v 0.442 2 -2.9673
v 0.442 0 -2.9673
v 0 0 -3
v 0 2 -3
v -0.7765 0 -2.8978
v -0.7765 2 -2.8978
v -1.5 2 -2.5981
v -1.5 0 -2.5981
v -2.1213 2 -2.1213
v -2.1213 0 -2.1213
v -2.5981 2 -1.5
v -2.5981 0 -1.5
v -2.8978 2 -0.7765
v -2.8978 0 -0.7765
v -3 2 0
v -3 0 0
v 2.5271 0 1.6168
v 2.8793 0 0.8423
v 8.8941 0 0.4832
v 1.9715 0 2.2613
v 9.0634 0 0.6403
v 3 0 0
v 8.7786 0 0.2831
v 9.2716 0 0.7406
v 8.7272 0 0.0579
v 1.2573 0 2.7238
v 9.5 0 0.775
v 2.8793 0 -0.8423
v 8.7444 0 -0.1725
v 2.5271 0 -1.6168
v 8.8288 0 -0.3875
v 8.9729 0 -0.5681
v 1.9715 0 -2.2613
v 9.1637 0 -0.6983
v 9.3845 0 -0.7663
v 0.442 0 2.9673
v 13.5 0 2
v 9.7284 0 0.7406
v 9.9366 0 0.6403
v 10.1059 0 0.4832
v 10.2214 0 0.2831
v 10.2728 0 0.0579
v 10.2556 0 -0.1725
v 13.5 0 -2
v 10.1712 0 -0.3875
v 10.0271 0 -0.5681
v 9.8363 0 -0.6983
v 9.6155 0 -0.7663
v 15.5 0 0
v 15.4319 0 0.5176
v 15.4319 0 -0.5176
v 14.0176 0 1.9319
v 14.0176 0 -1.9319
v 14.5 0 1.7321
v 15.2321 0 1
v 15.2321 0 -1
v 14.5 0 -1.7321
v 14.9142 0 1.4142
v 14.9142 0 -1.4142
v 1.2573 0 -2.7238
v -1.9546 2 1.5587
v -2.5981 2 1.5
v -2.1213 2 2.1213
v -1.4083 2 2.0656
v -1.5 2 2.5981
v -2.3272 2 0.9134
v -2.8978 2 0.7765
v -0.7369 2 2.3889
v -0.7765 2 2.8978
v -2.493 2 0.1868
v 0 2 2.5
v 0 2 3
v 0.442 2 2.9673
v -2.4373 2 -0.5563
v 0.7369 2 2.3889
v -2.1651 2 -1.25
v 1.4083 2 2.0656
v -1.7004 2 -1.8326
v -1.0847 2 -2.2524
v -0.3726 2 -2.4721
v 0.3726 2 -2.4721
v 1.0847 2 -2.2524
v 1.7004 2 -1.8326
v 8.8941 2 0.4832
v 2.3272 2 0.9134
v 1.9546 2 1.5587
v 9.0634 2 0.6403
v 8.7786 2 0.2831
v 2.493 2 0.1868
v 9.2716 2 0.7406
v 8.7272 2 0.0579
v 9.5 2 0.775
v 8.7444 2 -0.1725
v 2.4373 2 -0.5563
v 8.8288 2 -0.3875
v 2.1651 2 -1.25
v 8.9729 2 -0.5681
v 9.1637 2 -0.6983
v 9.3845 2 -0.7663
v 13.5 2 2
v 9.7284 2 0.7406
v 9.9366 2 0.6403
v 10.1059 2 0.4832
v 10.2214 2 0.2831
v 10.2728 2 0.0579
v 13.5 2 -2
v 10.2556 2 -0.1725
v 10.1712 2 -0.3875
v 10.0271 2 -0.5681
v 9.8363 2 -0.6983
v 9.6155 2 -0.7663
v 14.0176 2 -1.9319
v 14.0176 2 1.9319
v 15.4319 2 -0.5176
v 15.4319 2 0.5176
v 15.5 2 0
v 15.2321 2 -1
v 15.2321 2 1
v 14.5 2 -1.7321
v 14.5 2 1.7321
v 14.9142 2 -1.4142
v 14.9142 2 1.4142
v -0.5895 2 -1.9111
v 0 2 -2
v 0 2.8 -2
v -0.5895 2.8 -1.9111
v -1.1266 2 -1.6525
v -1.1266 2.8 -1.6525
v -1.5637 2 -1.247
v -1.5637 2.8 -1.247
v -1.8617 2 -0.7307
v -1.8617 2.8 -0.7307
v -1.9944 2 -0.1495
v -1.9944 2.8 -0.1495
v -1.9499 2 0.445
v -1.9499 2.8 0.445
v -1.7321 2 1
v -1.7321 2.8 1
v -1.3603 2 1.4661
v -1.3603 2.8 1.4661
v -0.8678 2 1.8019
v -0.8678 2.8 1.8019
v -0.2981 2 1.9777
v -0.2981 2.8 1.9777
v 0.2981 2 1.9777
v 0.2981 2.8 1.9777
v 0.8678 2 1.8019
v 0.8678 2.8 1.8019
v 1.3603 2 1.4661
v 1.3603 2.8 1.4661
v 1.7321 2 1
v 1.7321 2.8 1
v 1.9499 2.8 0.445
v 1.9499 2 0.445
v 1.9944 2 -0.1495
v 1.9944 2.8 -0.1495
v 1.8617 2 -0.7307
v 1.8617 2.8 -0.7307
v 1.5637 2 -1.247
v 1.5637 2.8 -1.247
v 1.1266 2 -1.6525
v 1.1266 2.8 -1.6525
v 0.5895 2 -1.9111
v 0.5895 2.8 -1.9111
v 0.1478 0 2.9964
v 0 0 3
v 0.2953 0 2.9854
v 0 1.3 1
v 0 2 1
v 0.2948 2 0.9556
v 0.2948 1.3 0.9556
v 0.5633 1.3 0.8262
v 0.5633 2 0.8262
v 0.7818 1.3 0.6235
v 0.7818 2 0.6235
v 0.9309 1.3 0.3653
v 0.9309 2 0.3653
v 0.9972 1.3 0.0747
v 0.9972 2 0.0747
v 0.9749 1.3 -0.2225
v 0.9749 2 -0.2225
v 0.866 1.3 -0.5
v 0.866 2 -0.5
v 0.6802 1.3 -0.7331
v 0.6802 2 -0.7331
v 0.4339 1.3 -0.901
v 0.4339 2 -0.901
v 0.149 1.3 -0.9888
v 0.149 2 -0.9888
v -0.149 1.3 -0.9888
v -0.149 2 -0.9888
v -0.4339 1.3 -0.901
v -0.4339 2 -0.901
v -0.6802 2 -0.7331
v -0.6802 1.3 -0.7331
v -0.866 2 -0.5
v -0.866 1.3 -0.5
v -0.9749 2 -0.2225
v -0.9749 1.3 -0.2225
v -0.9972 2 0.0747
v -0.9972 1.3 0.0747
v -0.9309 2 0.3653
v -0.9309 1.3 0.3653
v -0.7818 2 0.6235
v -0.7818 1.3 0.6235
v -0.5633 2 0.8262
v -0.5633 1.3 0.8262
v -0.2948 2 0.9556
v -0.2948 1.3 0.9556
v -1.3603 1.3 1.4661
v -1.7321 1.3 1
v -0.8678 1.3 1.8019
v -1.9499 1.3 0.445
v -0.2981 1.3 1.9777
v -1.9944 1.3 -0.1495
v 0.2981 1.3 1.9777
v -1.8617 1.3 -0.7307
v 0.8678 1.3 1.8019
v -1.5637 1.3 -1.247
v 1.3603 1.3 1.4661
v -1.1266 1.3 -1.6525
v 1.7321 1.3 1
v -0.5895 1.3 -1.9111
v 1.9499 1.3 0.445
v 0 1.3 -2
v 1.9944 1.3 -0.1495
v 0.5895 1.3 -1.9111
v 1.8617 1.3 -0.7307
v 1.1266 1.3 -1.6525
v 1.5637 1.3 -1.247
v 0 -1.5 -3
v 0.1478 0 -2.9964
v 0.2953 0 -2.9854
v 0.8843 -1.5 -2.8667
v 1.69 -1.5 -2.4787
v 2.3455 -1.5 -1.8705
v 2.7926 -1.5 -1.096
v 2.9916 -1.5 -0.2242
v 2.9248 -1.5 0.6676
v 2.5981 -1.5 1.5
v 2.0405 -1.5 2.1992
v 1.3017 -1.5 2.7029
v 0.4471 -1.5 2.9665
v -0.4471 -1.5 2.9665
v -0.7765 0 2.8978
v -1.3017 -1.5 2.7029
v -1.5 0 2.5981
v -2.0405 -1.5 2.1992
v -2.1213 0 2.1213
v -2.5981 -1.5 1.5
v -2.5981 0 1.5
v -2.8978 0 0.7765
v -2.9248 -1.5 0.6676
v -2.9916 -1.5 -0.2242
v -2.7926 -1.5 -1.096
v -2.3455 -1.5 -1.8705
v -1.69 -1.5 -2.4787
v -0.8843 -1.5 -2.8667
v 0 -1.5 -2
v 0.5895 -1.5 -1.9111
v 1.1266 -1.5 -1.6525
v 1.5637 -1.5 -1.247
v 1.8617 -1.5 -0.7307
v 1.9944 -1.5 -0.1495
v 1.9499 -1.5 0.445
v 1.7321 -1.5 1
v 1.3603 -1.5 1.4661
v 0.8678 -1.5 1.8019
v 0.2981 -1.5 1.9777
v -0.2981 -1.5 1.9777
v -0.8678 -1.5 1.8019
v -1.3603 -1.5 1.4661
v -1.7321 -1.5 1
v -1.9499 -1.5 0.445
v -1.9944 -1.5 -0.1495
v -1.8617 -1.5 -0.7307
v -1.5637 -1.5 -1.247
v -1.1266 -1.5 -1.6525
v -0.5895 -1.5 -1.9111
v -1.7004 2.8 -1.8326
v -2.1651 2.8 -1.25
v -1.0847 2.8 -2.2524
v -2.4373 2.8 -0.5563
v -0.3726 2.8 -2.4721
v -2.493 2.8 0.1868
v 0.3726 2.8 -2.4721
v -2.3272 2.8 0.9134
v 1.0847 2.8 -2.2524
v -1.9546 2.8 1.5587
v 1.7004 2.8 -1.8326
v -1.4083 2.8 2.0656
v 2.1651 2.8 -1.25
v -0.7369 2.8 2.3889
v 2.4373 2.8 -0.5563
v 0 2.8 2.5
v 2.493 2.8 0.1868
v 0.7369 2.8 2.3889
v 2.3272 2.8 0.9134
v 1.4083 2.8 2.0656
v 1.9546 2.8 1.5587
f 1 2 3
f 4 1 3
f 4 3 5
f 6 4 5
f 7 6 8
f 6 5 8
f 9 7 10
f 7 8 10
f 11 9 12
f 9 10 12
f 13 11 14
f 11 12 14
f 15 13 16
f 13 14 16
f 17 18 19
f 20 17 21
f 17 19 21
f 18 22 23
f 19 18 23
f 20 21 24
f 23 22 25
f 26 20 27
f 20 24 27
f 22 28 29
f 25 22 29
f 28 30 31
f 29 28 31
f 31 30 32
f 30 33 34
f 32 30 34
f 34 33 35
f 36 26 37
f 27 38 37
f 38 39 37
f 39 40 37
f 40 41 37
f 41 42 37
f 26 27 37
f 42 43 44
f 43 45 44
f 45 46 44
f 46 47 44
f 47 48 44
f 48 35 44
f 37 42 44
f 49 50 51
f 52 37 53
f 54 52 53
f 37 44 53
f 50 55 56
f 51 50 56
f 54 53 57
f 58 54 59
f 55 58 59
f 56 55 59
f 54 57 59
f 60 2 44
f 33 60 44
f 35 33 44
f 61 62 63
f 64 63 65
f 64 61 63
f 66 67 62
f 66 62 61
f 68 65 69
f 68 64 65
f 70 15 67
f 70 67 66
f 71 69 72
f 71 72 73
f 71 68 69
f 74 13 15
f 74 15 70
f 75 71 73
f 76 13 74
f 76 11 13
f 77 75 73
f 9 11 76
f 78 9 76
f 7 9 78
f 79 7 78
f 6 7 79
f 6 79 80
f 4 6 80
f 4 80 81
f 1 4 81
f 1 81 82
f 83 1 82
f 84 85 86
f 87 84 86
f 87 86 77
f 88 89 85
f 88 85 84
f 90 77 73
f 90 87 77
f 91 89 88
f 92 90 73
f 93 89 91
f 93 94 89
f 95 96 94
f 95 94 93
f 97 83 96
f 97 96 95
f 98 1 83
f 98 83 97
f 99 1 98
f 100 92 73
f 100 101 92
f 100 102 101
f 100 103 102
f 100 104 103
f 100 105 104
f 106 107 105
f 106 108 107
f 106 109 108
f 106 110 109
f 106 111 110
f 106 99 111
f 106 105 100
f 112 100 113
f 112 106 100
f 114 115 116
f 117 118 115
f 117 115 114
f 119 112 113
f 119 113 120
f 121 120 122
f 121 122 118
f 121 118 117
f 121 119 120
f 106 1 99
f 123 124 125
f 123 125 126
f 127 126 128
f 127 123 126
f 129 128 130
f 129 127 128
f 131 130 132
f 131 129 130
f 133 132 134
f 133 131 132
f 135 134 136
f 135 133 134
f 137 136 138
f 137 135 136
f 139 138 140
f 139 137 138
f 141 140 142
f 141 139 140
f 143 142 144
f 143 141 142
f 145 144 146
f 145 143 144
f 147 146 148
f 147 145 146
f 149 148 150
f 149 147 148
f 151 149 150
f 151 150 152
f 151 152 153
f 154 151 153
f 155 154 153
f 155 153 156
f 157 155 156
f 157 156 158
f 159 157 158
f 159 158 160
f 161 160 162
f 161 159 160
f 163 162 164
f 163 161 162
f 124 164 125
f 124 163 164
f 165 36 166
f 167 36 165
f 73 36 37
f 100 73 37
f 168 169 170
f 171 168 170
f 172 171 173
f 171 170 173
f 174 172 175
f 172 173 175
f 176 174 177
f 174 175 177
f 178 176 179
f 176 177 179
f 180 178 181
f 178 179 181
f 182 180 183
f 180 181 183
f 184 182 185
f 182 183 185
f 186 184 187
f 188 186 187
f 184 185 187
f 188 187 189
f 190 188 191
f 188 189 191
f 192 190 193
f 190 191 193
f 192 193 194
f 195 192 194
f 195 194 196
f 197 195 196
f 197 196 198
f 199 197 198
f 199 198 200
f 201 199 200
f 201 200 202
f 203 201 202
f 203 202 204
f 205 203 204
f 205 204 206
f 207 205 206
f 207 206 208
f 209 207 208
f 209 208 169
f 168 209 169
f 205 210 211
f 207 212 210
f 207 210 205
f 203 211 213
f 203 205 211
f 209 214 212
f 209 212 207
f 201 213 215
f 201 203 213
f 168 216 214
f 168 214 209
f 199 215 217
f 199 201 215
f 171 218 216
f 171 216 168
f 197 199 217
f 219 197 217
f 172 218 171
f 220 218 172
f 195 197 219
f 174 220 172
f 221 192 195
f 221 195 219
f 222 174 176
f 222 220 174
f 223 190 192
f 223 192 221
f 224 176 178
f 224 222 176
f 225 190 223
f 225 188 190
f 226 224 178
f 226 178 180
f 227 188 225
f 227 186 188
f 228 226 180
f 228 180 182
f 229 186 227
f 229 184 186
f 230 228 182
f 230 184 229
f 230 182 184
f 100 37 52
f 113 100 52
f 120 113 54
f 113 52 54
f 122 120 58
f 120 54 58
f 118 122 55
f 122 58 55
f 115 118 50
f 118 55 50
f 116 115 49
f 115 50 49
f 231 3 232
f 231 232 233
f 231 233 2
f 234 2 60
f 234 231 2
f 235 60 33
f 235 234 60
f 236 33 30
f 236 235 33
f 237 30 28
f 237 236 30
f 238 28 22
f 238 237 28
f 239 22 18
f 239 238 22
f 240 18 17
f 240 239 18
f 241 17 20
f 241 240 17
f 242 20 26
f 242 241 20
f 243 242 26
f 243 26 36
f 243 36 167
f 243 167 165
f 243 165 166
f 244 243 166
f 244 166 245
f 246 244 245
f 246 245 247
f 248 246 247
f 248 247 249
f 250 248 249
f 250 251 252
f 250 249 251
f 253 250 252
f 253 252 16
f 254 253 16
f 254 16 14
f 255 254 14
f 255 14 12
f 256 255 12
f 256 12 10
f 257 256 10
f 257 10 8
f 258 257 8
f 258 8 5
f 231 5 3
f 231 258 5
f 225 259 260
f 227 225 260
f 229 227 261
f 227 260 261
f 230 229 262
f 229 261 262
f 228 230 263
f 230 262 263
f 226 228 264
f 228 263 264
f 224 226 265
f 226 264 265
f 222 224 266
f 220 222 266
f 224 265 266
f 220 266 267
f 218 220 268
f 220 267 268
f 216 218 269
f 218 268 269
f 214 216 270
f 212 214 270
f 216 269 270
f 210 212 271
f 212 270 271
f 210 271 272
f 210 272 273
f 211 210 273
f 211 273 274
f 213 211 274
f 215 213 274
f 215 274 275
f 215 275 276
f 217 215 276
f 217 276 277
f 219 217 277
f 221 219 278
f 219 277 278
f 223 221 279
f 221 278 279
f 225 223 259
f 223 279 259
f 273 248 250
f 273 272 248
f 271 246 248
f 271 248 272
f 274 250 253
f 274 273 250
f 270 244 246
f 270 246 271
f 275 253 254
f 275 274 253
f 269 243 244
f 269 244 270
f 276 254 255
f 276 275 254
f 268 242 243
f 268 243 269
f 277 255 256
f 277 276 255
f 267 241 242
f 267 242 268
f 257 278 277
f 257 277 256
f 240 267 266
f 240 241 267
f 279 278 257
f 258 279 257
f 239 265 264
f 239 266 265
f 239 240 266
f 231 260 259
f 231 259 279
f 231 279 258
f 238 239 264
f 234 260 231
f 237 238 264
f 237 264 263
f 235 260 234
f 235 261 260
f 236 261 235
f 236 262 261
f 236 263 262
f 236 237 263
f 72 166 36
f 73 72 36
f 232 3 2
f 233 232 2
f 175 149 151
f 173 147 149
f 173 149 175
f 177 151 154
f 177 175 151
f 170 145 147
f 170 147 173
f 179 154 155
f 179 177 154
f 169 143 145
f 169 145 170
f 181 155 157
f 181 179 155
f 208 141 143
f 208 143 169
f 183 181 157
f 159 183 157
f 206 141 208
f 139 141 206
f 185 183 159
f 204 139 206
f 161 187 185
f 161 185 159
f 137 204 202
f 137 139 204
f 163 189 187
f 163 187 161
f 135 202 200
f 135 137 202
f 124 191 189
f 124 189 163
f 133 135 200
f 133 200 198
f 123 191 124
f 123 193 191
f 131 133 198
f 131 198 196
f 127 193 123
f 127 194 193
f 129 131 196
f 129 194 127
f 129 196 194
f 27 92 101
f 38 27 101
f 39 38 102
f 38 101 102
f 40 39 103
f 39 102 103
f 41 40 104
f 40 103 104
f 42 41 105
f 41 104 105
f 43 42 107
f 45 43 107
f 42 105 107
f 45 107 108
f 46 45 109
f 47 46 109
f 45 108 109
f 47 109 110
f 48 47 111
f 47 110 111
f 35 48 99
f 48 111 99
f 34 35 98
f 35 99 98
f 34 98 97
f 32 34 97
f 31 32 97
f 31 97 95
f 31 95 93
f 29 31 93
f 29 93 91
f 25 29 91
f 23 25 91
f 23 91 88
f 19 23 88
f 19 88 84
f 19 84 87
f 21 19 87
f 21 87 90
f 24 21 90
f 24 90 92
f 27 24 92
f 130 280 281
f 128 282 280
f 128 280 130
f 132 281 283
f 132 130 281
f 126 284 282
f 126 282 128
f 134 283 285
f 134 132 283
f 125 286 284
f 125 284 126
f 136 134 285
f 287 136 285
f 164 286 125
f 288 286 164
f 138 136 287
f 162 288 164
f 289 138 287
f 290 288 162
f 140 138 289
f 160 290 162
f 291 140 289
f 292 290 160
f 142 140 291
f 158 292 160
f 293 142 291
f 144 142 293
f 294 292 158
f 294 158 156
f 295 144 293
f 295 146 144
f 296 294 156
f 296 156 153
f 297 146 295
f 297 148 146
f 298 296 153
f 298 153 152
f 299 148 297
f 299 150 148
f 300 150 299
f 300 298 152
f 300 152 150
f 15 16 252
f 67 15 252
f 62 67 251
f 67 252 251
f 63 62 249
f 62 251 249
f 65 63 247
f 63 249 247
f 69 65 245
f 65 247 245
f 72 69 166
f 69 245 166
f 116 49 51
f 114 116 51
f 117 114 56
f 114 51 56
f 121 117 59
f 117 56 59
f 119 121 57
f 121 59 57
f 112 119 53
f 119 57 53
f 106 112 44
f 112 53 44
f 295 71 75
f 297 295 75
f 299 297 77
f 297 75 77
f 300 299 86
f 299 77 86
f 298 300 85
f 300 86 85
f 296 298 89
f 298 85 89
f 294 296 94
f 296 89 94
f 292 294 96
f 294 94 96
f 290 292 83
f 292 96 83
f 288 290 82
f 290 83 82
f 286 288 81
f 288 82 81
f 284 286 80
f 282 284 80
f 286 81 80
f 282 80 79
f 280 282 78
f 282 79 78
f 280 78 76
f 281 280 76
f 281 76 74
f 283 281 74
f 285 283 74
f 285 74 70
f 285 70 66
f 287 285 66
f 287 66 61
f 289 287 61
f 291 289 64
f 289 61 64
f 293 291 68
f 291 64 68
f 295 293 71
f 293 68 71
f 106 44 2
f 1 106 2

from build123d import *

# Parameters (mm, degrees)
EXTRUDE_1_DEPTH     = 2
SKETCH_3_R          = 2.5
EXTRUDE_2_DEPTH     = 0.8
EXTRUDE_START       = 1.5
SKETCH_4_R          = 3
EXTRUDE_3_DEPTH     = 1.5
SKETCH_5_R          = 2
CUT_EXTRUDE_1_DEPTH = 2.8
CUT_EXTRUDE_START   = -0.8
SKETCH_6_R          = 2
CUT_EXTRUDE_2_DEPTH = 0.8
SKETCH_7_R          = 1
CUT_EXTRUDE_3_DEPTH = 17.170961629
SKETCH_8_R          = 0.775
CUT_EXTRUDE_4_DEPTH = 17.170961629


with BuildPart() as part:
    # Эскиз2 → Бобышка-Вытянуть1 (new body)
    with BuildSketch(Plane(origin=(0, 0, 0), x_dir=(1, 0, 0), z_dir=(0, 1, 0))):
        with BuildLine():
            ThreePointArc((0.4420191, 2.967257844), (2.272229885, 1.958818866), (3, 0))
            Line((3, 0), (11.5, 0))
            ThreePointArc((11.5, 0), (12.085786438, 1.414213562), (13.5, 2))
            Line((13.5, 2), (0.4420191, 2.967257844))
        make_face()
        with BuildLine():
            ThreePointArc((0, 3), (-2.121320344, 2.121320344), (-3, 0))
            Line((-3, 0), (3, 0))
            ThreePointArc((3, 0), (2.272229885, 1.958818866), (0.4420191, 2.967257844))
            Line((0.4420191, 2.967257844), (0, 3))
        make_face()
        with BuildLine():
            Line((3, 0), (-3, 0))
            ThreePointArc((-3, 0), (-2.121320344, -2.121320344), (0, -3))
            Line((0, -3), (0.4420191, -2.967257844))
            ThreePointArc((0.4420191, -2.967257844), (2.272229885, -1.958818866), (3, 0))
        make_face()
        with BuildLine():
            Line((11.5, 0), (3, 0))
            ThreePointArc((3, 0), (2.272229885, -1.958818866), (0.4420191, -2.967257844))
            Line((0.4420191, -2.967257844), (13.5, -2))
            ThreePointArc((13.5, -2), (12.085786438, -1.414213562), (11.5, 0))
        make_face()
        with BuildLine():
            ThreePointArc((13.5, 2), (12.085786438, 1.414213562), (11.5, 0))
            Line((11.5, 0), (15.5, 0))
            ThreePointArc((15.5, 0), (14.914213562, 1.414213562), (13.5, 2))
        make_face()
        with BuildLine():
            Line((15.5, 0), (11.5, 0))
            ThreePointArc((11.5, 0), (12.085786438, -1.414213562), (13.5, -2))
            ThreePointArc((13.5, -2), (14.914213562, -1.414213562), (15.5, 0))
        make_face()
    extrude(amount=EXTRUDE_1_DEPTH)

    # Эскиз3 → Бобышка-Вытянуть2 (add)
    with BuildSketch(Plane(origin=(0, 2, 0), x_dir=(1, 0, 0), z_dir=(0, 1, 0))):
        with Locations(Location((0, 0, 0), (0, 0, 270))):
            Circle(SKETCH_3_R)
    extrude(amount=EXTRUDE_2_DEPTH)

    # Эскиз4 → Бобышка-Вытянуть3 (add)
    with BuildSketch(Plane.XZ.offset(EXTRUDE_START)):
        with Locations(Location((0, 0, 0), (0, 0, 270))):
            Circle(SKETCH_4_R)
    extrude(amount=-EXTRUDE_3_DEPTH)

    # Эскиз5 → Вырез-Вытянуть1 (cut)
    with BuildSketch(Plane(origin=(0, -1.5, 0), x_dir=(-1, 0, 0), z_dir=(0, -1, 0))):
        with Locations(Location((0, 0, 0), (0, 0, 90))):
            Circle(SKETCH_5_R)
    extrude(amount=-CUT_EXTRUDE_1_DEPTH, mode=Mode.SUBTRACT)

    # Эскиз6 → Вырез-Вытянуть2 (cut)
    with BuildSketch(Plane(origin=(0, 2.8, 0), x_dir=(1, 0, 0), z_dir=(0, 1, 0)).offset(CUT_EXTRUDE_START)):
        with Locations(Location((0, 0, 0), (0, 0, 90))):
            Circle(SKETCH_6_R)
    extrude(amount=CUT_EXTRUDE_2_DEPTH, mode=Mode.SUBTRACT)

    # Эскиз7 → Вырез-Вытянуть3 (cut, through all)
    with BuildSketch(Plane(origin=(0, 2, 0), x_dir=(1, 0, 0), z_dir=(0, 1, 0))):
        with Locations(Location((0, 0, 0), (0, 0, 270))):
            Circle(SKETCH_7_R)
    extrude(amount=-CUT_EXTRUDE_3_DEPTH, mode=Mode.SUBTRACT)

    # Эскиз8 → Вырез-Вытянуть4 (cut, through all)
    with BuildSketch(Plane(origin=(0, 2, 0), x_dir=(1, 0, 0), z_dir=(0, 1, 0))):
        with Locations(Location((9.5, 0, 0), (0, 0, 270))):
            Circle(SKETCH_8_R)
    extrude(amount=-CUT_EXTRUDE_4_DEPTH, mode=Mode.SUBTRACT)


solid = part.part
